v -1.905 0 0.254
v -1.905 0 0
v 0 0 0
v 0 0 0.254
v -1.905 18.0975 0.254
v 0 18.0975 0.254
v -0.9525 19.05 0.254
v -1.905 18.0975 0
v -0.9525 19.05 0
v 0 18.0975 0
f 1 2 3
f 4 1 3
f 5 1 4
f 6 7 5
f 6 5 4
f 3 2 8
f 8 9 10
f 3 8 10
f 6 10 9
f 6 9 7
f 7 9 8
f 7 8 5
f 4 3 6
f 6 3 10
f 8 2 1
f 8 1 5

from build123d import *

# Parameters (mm, degrees)
F0_W     = 1.905
F0_H     = 19.05
F1_DEPTH = 0.254
F2_SIZE  = 0.9525
F3_SIZE  = 0.95249


# Not quite as in the source:
# - a fillet or chamfer is up to 0.001 mm smaller than in the source, because OpenCascade refuses the exact size


with BuildPart() as f1:
    # F0 (on Top) → F1 (new body)
    with BuildSketch(Plane.XY):
        with Locations((-0.9525, 9.525)):
            Rectangle(F0_W, F0_H)
    extrude(amount=F1_DEPTH)

    # F2
    f2_edges = [f1.edges().sort_by_distance(p)[0] for p in [
        (-1.905, 19.05, 0.127),
    ]]
    chamfer(f2_edges, length=F2_SIZE)

    # F3 (size 0.9525 in the source; OpenCascade refuses exactly that, so slightly less here)
    f3_edges = [f1.edges().sort_by_distance(p)[0] for p in [
        (0, 19.05, 0.127),
    ]]
    chamfer(f3_edges, length=F3_SIZE)


solid = f1.part
